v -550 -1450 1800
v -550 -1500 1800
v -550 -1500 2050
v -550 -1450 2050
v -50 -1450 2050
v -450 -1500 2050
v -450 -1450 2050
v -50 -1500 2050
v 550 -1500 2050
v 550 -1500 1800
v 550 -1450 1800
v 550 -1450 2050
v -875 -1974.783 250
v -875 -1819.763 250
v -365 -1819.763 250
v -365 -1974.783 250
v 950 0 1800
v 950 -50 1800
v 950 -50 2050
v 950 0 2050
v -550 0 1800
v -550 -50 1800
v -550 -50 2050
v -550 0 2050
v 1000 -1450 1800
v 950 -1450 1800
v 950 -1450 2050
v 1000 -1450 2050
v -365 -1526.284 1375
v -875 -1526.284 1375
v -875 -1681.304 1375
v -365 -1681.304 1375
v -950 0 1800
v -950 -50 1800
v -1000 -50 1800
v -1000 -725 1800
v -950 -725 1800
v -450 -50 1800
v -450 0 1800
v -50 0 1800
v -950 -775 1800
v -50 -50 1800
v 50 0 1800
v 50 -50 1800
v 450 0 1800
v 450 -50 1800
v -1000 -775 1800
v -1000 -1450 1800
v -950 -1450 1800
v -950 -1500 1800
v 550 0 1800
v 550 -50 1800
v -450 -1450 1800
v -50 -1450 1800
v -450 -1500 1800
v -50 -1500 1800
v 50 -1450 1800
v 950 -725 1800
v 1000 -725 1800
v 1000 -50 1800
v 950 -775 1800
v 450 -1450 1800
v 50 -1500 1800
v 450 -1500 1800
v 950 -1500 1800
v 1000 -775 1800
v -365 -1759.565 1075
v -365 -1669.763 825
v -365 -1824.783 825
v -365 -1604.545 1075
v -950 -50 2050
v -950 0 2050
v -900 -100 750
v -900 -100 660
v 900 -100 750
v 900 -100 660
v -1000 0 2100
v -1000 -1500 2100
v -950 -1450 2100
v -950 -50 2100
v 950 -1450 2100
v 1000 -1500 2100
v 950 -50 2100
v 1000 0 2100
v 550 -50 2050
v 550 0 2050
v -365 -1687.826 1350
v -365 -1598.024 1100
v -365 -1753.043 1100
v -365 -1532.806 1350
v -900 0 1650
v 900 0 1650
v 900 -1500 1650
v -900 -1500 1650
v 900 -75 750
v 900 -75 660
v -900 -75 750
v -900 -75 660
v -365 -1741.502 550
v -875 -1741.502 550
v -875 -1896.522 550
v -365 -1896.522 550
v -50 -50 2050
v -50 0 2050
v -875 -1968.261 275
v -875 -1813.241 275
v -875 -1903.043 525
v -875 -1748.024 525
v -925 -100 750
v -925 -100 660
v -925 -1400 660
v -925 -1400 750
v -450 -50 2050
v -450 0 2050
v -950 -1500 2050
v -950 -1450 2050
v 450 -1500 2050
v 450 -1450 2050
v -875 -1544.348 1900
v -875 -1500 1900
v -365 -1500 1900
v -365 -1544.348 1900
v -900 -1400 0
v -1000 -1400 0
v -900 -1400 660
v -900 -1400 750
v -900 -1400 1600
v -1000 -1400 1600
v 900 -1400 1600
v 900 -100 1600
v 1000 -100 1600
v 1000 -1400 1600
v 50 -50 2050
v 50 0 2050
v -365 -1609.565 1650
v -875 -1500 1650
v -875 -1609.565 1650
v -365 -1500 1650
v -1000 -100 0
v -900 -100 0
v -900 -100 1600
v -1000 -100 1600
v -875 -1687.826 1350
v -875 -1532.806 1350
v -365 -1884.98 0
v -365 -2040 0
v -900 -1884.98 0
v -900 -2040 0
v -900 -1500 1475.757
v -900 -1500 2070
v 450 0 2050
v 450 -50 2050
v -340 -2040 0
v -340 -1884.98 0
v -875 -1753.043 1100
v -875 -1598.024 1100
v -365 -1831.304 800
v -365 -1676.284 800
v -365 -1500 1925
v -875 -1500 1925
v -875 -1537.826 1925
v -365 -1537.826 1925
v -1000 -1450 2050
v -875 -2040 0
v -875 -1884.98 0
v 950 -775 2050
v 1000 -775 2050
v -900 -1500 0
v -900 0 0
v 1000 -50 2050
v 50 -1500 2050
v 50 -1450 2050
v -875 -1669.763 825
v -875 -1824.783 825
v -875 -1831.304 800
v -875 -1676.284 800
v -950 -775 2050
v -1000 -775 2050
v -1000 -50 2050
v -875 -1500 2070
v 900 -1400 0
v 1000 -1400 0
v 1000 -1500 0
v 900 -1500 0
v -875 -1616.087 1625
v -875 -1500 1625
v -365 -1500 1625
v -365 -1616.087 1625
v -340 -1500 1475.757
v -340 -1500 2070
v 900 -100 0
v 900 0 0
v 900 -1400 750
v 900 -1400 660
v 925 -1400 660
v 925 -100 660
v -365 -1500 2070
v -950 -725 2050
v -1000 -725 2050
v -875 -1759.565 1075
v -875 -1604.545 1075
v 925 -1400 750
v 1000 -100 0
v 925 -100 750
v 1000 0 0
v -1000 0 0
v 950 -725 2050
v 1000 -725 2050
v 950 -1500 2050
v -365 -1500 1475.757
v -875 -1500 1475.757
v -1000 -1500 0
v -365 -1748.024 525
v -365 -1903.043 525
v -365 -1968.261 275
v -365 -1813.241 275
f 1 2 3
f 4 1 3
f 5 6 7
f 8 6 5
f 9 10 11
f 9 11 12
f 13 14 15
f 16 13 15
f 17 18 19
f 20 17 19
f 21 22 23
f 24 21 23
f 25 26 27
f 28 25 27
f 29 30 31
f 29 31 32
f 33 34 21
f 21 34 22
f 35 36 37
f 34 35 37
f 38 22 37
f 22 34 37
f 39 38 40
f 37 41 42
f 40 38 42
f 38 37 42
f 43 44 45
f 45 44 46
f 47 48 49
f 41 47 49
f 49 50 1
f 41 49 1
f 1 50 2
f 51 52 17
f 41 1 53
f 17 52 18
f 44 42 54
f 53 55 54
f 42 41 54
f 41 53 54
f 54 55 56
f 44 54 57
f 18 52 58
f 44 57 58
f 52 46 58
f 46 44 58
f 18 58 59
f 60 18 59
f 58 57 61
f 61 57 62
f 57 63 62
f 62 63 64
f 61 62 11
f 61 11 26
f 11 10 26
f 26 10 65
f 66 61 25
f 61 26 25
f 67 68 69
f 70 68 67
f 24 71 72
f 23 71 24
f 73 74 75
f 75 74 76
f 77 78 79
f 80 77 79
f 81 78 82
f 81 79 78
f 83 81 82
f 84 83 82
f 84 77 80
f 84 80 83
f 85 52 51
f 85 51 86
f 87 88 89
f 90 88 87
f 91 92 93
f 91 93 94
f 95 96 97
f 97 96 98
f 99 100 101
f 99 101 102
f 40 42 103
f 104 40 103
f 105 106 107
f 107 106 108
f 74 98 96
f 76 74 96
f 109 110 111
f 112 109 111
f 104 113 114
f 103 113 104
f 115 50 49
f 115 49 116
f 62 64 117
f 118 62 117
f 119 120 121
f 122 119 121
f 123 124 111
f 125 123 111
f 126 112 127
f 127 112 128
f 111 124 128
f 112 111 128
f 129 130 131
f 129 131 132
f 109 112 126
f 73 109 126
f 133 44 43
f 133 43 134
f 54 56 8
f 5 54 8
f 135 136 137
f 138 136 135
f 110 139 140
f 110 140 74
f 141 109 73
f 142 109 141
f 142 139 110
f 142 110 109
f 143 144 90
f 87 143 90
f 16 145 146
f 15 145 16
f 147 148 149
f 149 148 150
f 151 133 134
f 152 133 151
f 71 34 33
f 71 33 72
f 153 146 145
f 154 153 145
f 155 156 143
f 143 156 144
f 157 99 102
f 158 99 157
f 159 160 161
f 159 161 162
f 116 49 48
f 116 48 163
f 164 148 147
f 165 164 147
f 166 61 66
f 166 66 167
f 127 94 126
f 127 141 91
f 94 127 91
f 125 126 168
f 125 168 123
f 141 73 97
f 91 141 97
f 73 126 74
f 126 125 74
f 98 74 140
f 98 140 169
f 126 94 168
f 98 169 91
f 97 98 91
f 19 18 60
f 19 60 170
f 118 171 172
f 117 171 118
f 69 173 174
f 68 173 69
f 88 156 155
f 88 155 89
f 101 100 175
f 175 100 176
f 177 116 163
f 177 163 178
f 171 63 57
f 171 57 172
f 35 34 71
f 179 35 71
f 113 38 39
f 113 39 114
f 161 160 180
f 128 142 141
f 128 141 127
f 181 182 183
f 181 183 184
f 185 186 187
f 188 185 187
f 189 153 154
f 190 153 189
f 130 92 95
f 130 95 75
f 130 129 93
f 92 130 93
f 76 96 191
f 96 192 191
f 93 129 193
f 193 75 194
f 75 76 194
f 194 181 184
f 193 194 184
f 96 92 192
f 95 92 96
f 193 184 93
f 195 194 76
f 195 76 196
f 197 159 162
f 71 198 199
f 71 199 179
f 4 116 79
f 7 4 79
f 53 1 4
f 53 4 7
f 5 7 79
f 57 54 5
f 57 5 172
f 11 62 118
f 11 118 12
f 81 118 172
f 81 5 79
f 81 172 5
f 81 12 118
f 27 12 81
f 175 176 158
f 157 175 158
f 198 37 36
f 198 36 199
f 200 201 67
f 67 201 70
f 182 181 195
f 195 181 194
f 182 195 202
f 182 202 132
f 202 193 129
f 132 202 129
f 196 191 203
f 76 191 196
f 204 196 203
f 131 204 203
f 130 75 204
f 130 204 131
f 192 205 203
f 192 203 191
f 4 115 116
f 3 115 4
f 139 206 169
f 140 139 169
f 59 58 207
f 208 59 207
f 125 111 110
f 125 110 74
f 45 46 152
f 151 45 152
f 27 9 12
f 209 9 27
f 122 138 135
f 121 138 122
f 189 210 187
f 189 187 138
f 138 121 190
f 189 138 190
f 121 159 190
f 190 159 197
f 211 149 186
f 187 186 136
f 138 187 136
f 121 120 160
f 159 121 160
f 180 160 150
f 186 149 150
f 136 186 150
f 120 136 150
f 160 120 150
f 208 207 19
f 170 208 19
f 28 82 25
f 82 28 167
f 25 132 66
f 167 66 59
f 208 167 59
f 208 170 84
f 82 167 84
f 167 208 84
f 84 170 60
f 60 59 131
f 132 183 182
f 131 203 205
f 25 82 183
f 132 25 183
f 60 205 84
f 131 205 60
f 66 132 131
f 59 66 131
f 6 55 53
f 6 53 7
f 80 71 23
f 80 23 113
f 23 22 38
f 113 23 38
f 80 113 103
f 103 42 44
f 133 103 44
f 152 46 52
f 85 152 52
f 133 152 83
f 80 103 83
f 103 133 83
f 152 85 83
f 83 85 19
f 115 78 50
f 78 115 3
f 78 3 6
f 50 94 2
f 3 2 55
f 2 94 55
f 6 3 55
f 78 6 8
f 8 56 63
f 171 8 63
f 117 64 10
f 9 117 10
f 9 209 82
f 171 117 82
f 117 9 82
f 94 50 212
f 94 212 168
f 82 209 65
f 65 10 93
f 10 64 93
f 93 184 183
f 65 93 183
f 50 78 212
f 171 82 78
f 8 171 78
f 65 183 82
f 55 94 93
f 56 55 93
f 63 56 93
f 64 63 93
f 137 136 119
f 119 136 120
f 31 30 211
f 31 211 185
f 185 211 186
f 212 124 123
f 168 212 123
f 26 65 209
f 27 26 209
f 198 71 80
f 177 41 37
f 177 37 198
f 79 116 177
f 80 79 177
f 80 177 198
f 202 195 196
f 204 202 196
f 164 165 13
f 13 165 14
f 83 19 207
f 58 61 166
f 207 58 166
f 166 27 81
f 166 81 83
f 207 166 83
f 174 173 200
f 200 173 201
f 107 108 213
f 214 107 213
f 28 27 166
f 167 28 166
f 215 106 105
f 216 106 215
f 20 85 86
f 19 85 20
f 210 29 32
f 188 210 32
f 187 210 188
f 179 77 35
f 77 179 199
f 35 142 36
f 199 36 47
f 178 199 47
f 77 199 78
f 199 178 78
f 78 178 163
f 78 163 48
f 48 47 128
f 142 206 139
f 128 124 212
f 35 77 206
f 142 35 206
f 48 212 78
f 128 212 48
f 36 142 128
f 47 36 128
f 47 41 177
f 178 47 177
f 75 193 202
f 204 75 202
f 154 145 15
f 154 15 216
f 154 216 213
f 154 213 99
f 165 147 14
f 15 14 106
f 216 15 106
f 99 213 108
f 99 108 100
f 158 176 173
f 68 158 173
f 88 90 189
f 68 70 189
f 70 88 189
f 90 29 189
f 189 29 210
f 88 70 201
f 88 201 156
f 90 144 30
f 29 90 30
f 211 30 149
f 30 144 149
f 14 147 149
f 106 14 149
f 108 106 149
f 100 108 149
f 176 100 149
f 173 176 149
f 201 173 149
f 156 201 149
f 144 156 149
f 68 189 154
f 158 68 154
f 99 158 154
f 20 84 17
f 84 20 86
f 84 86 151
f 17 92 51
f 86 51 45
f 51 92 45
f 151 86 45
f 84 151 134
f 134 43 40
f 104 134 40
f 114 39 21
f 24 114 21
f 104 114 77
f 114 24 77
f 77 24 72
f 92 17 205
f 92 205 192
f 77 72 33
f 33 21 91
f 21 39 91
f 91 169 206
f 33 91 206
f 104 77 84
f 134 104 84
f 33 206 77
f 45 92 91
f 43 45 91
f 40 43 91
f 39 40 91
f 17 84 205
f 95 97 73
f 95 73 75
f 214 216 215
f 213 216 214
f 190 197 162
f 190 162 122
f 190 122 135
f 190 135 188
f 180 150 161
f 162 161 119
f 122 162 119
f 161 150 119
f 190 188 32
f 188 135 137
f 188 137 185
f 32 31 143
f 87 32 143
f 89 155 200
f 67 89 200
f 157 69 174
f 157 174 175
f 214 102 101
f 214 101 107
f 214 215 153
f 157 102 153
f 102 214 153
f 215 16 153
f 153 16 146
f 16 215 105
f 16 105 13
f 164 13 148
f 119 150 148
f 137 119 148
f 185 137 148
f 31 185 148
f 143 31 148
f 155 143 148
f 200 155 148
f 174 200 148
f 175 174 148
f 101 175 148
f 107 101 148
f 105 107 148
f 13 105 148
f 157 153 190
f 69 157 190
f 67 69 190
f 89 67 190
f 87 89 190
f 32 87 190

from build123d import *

# Parameters (mm, degrees)
F1_DEPTH      = 1500
F3_W          = 1900
F3_H          = 1400
F4_DEPTH      = 300
F5_W          = 400
F5_H          = 250
F6_DEPTH      = 1500.001
F7_W          = 675
F7_H          = 250
F8_DEPTH      = 1950.001
F8_DEPTH_BACK = 50.001
F9_W          = 1300
F9_H          = 1600
F10_DEPTH     = 2000.001
F14_DEPTH     = 560
F15_W         = 510
F15_H         = 250
F16_DEPTH     = 540.001
F18_DEPTH     = 90


with BuildPart() as f1:
    # F0 (on Front) → F1 (new body)
    with BuildSketch(Plane.XZ):
        Polygon((-1000, 1800), (-1000, 0), (-900, 0), (-900, 1650), (0, 1650), (0, 1800), align=None)
    extrude(amount=F1_DEPTH)

    # F2: F1 across plane


with BuildPart() as f1_1:
    add(f1.part)
    add(f1.part.mirror(Plane.YZ))

    # F3 (on face) → F4 (join)
    with BuildSketch(Plane.XY.offset(1800)):
        Polygon((-1000, -1500), (1000, -1500), (1000, -1450), (1000, 0), (-1000, 0), (-1000, -50), align=None)
        with Locations((0, -750)):
            Rectangle(F3_W, F3_H, mode=Mode.SUBTRACT)
    extrude(amount=F4_DEPTH)

    # F5 (on face) → F6 (cut, through all)
    with BuildSketch(Plane.XZ.offset(1500)):
        with Locations((-750, 1925)):
            Rectangle(F5_W, F5_H)
        with Locations((-250, 1925)):
            Rectangle(F5_W, F5_H)
        with Locations((250, 1925)):
            Rectangle(F5_W, F5_H)
        with Locations((750, 1925)):
            Rectangle(F5_W, F5_H)
        with Locations((1250, 1925)):
            Rectangle(F5_W, F5_H)
    extrude(amount=-F6_DEPTH, mode=Mode.SUBTRACT)

    # F7 (on face) → F8 (cut, two sides)
    with BuildSketch(Plane.YZ.offset(-950)) as f8_sk:
        with Locations((-1112.5, 1925)):
            Rectangle(F7_W, F7_H)
        with Locations((-387.5, 1925)):
            Rectangle(F7_W, F7_H)
    extrude(amount=F8_DEPTH, mode=Mode.SUBTRACT)
    extrude(f8_sk.sketch, amount=-F8_DEPTH_BACK, mode=Mode.SUBTRACT)

    # F9 (on face) → F10 (cut, through all)
    with BuildSketch(Plane(origin=(-1000, 0, 0), x_dir=(0, -1, 0), z_dir=(-1, 0, 0))):
        with Locations((750, 800)):
            Rectangle(F9_W, F9_H)
    extrude(amount=-F10_DEPTH, mode=Mode.SUBTRACT)

    # F17 (on offset) → F18 (join)
    with BuildSketch(Plane.XY.offset(660)):
        Polygon((-925, -75), (-925, -1400), (-900, -1400), (-900, -100), (900, -100), (900, -1400), (925, -1400), (925, -75), align=None)
    extrude(amount=F18_DEPTH)


with BuildPart() as f14:
    # F13 (on offset) → F14 (new body)
    with BuildSketch(Plane.YZ.offset(-900)):
        Polygon((-1500, 1475.7567837998), (-1500, 2070), (-2040, 0), (-1884.9800305565, 0), align=None)
    extrude(amount=F14_DEPTH)

    # F15 (on face) → F16 (cut, through all)
    with BuildSketch(Plane.XZ.offset(1500)):
        with Locations((-620, 125)):
            Rectangle(F15_W, F15_H)
        with Locations((-620, 400)):
            Rectangle(F15_W, F15_H)
        with Locations((-620, 675)):
            Rectangle(F15_W, F15_H)
        with Locations((-620, 950)):
            Rectangle(F15_W, F15_H)
        with Locations((-620, 1225)):
            Rectangle(F15_W, F15_H)
        with Locations((-620, 1500)):
            Rectangle(F15_W, F15_H)
        with Locations((-620, 1775)):
            Rectangle(F15_W, F15_H)
        with Locations((-620, 2050)):
            Rectangle(F15_W, F15_H)
    extrude(amount=F16_DEPTH, mode=Mode.SUBTRACT)


solid = Compound([f1_1.part, f14.part])
